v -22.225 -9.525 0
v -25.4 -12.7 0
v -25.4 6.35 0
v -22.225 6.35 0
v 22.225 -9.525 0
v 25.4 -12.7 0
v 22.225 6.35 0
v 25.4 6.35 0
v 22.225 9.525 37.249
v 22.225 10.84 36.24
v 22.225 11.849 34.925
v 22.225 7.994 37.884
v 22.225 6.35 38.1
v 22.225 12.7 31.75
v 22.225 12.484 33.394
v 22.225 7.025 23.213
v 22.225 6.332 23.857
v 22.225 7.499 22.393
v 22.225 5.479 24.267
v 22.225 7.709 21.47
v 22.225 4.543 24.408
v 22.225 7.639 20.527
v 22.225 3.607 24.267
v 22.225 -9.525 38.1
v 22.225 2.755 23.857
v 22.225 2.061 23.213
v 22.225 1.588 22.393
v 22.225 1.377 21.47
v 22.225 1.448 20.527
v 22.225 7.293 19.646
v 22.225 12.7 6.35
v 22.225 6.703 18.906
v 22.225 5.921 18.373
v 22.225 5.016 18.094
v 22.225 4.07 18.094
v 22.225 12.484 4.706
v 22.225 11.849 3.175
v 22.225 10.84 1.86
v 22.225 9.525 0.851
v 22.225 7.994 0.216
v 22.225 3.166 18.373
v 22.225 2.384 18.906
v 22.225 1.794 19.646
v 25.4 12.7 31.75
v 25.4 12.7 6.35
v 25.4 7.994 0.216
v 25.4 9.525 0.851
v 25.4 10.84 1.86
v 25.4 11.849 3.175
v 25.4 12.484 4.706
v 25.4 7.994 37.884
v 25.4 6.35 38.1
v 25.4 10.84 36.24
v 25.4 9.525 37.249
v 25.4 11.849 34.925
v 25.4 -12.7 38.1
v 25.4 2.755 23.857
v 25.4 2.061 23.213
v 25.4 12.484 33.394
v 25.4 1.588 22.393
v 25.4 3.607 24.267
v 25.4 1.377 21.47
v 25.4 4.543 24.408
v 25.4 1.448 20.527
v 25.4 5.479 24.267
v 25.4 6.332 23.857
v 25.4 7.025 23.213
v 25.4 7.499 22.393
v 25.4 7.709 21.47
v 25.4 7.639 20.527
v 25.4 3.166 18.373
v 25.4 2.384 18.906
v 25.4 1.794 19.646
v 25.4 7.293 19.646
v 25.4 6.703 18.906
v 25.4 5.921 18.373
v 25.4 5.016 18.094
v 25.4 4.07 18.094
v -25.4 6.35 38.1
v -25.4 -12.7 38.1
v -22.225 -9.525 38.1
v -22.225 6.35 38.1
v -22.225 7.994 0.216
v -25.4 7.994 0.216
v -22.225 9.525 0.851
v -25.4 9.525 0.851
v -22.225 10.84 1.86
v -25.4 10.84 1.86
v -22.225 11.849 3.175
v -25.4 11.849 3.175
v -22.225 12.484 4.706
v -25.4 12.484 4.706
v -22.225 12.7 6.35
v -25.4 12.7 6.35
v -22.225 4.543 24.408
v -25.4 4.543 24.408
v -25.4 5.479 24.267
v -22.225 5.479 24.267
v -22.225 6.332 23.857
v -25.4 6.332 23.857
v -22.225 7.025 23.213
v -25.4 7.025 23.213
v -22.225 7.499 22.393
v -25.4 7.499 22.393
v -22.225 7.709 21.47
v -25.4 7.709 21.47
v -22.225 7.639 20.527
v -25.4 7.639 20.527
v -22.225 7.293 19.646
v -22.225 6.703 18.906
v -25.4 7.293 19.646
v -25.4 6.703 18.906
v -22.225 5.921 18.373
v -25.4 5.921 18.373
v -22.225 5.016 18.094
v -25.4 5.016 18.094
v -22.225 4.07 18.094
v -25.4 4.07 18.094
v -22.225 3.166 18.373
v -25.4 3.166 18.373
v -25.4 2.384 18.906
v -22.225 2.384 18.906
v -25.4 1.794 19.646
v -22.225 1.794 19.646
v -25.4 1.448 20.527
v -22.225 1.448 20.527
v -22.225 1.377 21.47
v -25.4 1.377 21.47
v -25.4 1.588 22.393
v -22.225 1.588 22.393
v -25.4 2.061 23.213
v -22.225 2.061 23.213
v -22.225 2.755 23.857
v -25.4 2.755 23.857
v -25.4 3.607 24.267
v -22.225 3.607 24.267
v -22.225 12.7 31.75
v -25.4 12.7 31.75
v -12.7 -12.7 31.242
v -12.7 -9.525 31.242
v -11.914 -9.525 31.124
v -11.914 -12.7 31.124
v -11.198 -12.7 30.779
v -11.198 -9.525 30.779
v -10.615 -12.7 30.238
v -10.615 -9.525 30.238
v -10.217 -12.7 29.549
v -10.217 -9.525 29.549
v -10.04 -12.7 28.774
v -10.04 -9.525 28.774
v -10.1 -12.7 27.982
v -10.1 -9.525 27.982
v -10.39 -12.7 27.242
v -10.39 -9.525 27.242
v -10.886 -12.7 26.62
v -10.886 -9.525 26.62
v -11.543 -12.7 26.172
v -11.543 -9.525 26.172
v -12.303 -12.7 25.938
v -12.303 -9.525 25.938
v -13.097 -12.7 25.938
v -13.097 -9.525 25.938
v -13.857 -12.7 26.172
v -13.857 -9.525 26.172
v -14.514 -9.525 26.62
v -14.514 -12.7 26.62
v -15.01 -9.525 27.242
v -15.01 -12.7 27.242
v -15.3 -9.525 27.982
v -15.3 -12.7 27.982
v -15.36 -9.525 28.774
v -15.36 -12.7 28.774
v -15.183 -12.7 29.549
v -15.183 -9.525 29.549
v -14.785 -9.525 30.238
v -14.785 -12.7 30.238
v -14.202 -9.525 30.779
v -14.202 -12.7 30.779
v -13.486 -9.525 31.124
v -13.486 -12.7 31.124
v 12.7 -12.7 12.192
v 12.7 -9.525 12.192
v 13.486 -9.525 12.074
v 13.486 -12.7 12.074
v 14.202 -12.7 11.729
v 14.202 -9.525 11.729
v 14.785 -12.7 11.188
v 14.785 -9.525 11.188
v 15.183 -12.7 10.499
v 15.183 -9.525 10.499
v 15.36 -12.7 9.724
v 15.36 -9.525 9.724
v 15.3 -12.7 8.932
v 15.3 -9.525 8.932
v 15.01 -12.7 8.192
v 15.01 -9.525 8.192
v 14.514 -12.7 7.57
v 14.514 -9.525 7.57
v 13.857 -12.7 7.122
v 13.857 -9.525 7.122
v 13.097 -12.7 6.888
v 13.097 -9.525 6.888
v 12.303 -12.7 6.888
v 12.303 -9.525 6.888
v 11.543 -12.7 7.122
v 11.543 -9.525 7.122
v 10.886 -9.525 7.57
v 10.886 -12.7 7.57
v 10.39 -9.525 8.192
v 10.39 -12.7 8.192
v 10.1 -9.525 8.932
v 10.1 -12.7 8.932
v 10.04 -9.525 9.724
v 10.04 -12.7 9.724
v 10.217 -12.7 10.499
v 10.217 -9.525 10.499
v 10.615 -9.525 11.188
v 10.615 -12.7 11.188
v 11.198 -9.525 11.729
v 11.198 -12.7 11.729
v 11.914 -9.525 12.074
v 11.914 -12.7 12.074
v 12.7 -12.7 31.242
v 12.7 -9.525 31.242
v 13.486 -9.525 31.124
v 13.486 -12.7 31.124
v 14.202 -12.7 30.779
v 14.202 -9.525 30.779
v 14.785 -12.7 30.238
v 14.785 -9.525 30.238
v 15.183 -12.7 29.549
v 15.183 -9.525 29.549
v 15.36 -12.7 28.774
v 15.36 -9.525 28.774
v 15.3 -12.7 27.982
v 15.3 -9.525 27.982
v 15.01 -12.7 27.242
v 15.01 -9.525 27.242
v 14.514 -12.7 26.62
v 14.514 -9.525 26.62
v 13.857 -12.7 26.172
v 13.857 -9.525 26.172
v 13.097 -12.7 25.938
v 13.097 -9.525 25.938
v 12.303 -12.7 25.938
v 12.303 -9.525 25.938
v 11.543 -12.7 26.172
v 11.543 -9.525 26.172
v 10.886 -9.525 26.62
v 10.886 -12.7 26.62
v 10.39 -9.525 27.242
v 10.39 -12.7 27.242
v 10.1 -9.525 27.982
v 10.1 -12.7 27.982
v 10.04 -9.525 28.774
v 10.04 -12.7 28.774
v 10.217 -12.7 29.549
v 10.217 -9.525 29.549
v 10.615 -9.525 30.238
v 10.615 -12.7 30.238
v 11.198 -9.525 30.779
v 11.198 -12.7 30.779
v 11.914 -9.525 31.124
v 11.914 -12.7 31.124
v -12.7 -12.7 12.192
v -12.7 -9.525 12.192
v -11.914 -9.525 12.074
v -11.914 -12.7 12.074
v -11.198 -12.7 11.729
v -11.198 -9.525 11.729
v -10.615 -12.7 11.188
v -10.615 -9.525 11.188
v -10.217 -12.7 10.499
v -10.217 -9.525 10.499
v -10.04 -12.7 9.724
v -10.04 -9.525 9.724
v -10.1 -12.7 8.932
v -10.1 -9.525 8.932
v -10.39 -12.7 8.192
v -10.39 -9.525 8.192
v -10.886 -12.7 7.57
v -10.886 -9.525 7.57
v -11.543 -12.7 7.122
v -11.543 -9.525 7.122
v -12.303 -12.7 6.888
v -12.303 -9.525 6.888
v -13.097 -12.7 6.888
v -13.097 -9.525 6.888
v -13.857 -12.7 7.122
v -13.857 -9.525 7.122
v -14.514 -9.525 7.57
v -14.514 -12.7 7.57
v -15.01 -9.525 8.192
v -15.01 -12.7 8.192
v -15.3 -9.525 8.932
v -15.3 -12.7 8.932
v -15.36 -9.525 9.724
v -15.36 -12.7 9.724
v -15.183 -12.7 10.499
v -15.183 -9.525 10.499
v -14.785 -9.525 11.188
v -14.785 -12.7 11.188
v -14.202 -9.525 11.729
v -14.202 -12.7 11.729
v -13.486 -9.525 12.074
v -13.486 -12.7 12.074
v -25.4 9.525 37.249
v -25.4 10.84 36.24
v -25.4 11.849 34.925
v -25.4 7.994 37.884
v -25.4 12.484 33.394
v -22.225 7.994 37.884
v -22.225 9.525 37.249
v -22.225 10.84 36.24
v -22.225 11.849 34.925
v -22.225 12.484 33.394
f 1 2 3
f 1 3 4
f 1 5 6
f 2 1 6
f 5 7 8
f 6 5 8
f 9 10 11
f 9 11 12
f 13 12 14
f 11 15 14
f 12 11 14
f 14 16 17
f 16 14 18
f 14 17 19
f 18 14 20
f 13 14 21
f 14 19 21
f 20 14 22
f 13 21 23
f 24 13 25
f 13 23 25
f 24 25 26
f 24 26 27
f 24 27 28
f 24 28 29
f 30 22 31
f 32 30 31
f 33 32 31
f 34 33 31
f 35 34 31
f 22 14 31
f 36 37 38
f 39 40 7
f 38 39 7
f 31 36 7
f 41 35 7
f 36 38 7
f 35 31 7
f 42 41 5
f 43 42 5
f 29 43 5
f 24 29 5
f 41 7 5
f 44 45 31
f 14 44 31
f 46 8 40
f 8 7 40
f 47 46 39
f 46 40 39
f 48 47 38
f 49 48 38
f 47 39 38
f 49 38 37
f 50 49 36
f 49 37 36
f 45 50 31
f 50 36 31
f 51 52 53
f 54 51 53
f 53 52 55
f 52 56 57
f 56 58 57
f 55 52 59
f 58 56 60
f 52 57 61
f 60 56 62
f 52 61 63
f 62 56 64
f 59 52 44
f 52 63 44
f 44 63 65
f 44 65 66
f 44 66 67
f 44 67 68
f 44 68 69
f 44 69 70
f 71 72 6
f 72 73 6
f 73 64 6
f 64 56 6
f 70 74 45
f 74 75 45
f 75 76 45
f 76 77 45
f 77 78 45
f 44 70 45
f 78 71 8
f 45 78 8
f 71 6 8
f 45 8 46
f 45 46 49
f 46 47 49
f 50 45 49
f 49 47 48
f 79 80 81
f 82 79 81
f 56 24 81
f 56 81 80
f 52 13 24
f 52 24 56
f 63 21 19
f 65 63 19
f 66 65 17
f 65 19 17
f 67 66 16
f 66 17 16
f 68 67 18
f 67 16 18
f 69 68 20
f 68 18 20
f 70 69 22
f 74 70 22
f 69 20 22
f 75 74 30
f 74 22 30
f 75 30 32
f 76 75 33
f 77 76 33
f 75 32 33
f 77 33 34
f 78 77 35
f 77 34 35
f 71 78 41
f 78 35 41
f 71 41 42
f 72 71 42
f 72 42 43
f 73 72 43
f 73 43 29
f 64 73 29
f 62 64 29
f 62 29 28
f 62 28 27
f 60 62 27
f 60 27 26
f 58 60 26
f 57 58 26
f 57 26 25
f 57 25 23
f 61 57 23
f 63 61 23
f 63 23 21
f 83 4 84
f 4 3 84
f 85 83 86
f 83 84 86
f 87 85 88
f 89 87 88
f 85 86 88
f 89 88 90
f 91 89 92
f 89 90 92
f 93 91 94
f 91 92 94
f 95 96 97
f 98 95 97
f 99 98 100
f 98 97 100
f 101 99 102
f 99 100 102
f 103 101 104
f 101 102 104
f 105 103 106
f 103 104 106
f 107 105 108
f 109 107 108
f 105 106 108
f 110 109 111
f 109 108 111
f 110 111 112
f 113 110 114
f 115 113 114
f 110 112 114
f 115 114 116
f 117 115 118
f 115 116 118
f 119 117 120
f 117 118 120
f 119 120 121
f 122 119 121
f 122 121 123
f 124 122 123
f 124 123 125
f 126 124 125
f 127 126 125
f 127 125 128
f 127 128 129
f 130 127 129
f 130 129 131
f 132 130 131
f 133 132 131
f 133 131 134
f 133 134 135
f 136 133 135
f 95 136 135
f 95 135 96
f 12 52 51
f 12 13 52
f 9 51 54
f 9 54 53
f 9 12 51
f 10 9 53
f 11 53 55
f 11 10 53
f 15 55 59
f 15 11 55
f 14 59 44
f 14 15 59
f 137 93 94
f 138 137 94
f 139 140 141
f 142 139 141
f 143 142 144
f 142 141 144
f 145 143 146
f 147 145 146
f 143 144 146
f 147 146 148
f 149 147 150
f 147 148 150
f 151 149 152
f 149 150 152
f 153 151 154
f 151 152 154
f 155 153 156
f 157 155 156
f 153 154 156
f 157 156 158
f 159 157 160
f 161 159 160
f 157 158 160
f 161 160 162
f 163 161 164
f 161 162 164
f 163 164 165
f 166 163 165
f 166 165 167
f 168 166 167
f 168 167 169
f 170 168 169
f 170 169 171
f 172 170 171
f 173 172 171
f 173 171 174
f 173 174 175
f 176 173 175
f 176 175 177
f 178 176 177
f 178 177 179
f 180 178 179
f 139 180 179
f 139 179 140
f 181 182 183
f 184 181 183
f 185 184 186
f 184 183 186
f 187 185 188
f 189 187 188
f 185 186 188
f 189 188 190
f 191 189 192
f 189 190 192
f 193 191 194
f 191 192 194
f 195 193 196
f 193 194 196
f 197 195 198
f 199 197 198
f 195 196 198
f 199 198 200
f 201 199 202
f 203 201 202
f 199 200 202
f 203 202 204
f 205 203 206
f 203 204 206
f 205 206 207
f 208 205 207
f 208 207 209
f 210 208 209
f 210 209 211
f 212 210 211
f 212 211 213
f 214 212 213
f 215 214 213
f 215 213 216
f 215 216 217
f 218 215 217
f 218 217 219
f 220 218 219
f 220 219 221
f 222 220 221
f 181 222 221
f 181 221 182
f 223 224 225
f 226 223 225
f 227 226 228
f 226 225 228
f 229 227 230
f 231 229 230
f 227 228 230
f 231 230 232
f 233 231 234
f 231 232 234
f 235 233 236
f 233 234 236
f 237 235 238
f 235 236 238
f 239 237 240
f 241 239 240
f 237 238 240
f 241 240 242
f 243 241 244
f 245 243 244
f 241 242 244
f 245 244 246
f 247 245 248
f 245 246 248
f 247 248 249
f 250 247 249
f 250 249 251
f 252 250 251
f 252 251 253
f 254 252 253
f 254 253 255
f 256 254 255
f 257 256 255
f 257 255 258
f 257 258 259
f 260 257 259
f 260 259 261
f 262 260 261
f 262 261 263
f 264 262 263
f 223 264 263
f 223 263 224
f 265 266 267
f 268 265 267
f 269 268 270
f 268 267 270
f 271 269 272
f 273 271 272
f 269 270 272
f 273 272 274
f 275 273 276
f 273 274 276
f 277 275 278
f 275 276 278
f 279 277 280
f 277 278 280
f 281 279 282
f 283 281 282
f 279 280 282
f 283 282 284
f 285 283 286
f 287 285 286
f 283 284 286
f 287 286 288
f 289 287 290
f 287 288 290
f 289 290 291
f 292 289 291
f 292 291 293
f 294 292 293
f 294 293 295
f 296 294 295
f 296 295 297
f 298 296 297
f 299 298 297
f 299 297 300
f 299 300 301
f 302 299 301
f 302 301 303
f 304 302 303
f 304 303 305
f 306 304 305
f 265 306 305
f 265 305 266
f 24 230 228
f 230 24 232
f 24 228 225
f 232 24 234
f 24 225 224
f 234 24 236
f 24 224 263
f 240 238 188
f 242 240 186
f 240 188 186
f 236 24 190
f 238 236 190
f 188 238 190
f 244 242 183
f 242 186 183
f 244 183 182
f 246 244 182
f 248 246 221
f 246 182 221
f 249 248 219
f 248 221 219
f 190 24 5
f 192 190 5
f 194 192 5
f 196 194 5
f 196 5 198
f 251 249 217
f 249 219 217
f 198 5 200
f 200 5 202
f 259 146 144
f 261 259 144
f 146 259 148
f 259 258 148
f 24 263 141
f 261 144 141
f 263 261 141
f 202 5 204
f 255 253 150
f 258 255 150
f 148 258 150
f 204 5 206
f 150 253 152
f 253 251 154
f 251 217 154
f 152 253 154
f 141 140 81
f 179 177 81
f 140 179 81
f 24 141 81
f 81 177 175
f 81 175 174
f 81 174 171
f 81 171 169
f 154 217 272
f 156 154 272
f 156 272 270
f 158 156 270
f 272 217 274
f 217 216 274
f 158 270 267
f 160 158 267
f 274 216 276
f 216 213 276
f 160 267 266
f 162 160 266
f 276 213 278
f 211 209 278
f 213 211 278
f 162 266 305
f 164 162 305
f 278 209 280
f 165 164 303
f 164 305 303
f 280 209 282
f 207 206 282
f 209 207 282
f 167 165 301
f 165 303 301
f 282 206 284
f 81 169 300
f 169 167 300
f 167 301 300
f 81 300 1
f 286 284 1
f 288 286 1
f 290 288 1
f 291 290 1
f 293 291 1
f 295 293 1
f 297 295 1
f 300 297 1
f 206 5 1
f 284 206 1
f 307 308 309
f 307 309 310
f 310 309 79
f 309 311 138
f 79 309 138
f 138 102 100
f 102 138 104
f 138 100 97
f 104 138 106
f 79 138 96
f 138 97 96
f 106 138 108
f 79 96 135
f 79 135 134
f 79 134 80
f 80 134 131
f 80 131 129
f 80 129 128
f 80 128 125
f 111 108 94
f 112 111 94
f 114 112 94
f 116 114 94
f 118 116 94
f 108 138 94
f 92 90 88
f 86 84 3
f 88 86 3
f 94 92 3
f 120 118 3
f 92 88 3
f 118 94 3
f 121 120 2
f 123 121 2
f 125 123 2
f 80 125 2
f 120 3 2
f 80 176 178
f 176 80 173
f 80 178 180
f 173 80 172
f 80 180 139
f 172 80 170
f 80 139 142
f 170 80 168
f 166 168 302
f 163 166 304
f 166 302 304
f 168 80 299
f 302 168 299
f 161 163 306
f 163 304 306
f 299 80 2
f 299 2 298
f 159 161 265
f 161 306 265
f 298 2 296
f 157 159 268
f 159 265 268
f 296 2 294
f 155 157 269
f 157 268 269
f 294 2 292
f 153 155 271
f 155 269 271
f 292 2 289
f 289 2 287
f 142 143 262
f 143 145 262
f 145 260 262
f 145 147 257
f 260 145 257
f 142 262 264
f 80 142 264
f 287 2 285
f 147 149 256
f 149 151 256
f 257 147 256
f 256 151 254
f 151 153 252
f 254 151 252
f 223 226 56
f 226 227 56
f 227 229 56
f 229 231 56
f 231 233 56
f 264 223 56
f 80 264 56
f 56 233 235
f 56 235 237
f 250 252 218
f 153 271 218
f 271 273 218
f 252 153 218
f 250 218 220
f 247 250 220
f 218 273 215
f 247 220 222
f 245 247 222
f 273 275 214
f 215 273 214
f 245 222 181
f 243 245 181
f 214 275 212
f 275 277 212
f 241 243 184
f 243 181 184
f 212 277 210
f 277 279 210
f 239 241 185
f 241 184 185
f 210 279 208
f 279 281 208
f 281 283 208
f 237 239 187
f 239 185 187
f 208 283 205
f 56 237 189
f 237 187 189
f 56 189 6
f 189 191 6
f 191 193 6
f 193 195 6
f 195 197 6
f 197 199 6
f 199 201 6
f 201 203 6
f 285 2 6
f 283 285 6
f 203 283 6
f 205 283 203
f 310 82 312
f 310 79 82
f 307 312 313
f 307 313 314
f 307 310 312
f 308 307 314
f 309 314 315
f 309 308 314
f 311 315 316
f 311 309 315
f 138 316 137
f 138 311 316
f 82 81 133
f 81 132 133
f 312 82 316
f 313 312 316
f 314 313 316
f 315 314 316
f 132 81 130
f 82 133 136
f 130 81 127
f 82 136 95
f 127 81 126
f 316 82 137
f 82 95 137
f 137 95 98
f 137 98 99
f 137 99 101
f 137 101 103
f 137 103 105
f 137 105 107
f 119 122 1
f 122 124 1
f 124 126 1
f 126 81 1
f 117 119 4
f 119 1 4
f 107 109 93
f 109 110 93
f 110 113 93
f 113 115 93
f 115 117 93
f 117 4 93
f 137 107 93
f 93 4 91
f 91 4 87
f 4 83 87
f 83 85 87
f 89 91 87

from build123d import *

# Parameters (mm, degrees)
BOSS_EXTRUDE1_DEPTH = 38.1
SKETCH2_R           = 3.175
CUT_EXTRUDE1_DEPTH  = 65.757547823
CUT_EXTRUDE2_REACH  = 52.899
SKETCH3_R           = 2.667
FILLET1_R           = 6.35


with BuildPart() as part:
    # Sketch1 → Boss-Extrude1 (new body)
    with BuildSketch(Plane.XY):
        Polygon((-22.225, -9.525), (-22.225, 12.7), (-25.4, 12.7), (-25.4, -12.7), (25.4, -12.7), (25.4, 12.7), (22.225, 12.7), (22.225, -9.525), align=None)
    extrude(amount=BOSS_EXTRUDE1_DEPTH)

    # Sketch2 → Cut-Extrude1 (cut, through all)
    with BuildSketch(Plane.ZY.offset(25.4)):
        with Locations((21.233208268, 4.543167929)):
            Circle(SKETCH2_R)
    extrude(amount=-CUT_EXTRUDE1_DEPTH, mode=Mode.SUBTRACT)

    # Sketch3 → Cut-Extrude2 (cut, up to next)
    with BuildSketch(Plane(origin=(0, -9.525, 0), x_dir=(1, 0, 0), z_dir=(0, 1, 0)), mode=Mode.PRIVATE) as cut_extrude2_sk1:
        with Locations(Location((12.7, -9.525, 0), (0, 0, 270))):
            Circle(SKETCH3_R)
    cut_extrude2_tool1 = extrude(cut_extrude2_sk1.sketch, amount=-CUT_EXTRUDE2_REACH, mode=Mode.PRIVATE) & part.part
    # Sketch3 → Cut-Extrude2 (cut, up to next)
    with BuildSketch(Plane(origin=(0, -9.525, 0), x_dir=(1, 0, 0), z_dir=(0, 1, 0)), mode=Mode.PRIVATE) as cut_extrude2_sk2:
        with Locations(Location((12.7, -28.575, 0), (0, 0, 270))):
            Circle(SKETCH3_R)
    cut_extrude2_tool2 = extrude(cut_extrude2_sk2.sketch, amount=-CUT_EXTRUDE2_REACH, mode=Mode.PRIVATE) & part.part
    # Sketch3 → Cut-Extrude2 (cut, up to next)
    with BuildSketch(Plane(origin=(0, -9.525, 0), x_dir=(1, 0, 0), z_dir=(0, 1, 0)), mode=Mode.PRIVATE) as cut_extrude2_sk3:
        with Locations(Location((-12.7, -28.575, 0), (0, 0, 270))):
            Circle(SKETCH3_R)
    cut_extrude2_tool3 = extrude(cut_extrude2_sk3.sketch, amount=-CUT_EXTRUDE2_REACH, mode=Mode.PRIVATE) & part.part
    # Sketch3 → Cut-Extrude2 (cut, up to next)
    with BuildSketch(Plane(origin=(0, -9.525, 0), x_dir=(1, 0, 0), z_dir=(0, 1, 0)), mode=Mode.PRIVATE) as cut_extrude2_sk4:
        with Locations(Location((-12.7, -9.525, 0), (0, 0, 270))):
            Circle(SKETCH3_R)
    cut_extrude2_tool4 = extrude(cut_extrude2_sk4.sketch, amount=-CUT_EXTRUDE2_REACH, mode=Mode.PRIVATE) & part.part
    add(cut_extrude2_tool1.solids().sort_by_distance((12.7, -9.525, 9.525))[0], mode=Mode.SUBTRACT)
    add(cut_extrude2_tool2.solids().sort_by_distance((12.7, -9.525, 28.575))[0], mode=Mode.SUBTRACT)
    add(cut_extrude2_tool3.solids().sort_by_distance((-12.7, -9.525, 28.575))[0], mode=Mode.SUBTRACT)
    add(cut_extrude2_tool4.solids().sort_by_distance((-12.7, -9.525, 9.525))[0], mode=Mode.SUBTRACT)

    # Fillet1
    fillet1_edges = [part.edges().sort_by_distance(p)[0] for p in [
        (-23.8125, 12.7, 38.1),
        (23.8125, 12.7, 38.1),
        (23.8125, 12.7, 0),
        (-23.8125, 12.7, 0),
    ]]
    fillet(fillet1_edges, radius=FILLET1_R)


solid = part.part
